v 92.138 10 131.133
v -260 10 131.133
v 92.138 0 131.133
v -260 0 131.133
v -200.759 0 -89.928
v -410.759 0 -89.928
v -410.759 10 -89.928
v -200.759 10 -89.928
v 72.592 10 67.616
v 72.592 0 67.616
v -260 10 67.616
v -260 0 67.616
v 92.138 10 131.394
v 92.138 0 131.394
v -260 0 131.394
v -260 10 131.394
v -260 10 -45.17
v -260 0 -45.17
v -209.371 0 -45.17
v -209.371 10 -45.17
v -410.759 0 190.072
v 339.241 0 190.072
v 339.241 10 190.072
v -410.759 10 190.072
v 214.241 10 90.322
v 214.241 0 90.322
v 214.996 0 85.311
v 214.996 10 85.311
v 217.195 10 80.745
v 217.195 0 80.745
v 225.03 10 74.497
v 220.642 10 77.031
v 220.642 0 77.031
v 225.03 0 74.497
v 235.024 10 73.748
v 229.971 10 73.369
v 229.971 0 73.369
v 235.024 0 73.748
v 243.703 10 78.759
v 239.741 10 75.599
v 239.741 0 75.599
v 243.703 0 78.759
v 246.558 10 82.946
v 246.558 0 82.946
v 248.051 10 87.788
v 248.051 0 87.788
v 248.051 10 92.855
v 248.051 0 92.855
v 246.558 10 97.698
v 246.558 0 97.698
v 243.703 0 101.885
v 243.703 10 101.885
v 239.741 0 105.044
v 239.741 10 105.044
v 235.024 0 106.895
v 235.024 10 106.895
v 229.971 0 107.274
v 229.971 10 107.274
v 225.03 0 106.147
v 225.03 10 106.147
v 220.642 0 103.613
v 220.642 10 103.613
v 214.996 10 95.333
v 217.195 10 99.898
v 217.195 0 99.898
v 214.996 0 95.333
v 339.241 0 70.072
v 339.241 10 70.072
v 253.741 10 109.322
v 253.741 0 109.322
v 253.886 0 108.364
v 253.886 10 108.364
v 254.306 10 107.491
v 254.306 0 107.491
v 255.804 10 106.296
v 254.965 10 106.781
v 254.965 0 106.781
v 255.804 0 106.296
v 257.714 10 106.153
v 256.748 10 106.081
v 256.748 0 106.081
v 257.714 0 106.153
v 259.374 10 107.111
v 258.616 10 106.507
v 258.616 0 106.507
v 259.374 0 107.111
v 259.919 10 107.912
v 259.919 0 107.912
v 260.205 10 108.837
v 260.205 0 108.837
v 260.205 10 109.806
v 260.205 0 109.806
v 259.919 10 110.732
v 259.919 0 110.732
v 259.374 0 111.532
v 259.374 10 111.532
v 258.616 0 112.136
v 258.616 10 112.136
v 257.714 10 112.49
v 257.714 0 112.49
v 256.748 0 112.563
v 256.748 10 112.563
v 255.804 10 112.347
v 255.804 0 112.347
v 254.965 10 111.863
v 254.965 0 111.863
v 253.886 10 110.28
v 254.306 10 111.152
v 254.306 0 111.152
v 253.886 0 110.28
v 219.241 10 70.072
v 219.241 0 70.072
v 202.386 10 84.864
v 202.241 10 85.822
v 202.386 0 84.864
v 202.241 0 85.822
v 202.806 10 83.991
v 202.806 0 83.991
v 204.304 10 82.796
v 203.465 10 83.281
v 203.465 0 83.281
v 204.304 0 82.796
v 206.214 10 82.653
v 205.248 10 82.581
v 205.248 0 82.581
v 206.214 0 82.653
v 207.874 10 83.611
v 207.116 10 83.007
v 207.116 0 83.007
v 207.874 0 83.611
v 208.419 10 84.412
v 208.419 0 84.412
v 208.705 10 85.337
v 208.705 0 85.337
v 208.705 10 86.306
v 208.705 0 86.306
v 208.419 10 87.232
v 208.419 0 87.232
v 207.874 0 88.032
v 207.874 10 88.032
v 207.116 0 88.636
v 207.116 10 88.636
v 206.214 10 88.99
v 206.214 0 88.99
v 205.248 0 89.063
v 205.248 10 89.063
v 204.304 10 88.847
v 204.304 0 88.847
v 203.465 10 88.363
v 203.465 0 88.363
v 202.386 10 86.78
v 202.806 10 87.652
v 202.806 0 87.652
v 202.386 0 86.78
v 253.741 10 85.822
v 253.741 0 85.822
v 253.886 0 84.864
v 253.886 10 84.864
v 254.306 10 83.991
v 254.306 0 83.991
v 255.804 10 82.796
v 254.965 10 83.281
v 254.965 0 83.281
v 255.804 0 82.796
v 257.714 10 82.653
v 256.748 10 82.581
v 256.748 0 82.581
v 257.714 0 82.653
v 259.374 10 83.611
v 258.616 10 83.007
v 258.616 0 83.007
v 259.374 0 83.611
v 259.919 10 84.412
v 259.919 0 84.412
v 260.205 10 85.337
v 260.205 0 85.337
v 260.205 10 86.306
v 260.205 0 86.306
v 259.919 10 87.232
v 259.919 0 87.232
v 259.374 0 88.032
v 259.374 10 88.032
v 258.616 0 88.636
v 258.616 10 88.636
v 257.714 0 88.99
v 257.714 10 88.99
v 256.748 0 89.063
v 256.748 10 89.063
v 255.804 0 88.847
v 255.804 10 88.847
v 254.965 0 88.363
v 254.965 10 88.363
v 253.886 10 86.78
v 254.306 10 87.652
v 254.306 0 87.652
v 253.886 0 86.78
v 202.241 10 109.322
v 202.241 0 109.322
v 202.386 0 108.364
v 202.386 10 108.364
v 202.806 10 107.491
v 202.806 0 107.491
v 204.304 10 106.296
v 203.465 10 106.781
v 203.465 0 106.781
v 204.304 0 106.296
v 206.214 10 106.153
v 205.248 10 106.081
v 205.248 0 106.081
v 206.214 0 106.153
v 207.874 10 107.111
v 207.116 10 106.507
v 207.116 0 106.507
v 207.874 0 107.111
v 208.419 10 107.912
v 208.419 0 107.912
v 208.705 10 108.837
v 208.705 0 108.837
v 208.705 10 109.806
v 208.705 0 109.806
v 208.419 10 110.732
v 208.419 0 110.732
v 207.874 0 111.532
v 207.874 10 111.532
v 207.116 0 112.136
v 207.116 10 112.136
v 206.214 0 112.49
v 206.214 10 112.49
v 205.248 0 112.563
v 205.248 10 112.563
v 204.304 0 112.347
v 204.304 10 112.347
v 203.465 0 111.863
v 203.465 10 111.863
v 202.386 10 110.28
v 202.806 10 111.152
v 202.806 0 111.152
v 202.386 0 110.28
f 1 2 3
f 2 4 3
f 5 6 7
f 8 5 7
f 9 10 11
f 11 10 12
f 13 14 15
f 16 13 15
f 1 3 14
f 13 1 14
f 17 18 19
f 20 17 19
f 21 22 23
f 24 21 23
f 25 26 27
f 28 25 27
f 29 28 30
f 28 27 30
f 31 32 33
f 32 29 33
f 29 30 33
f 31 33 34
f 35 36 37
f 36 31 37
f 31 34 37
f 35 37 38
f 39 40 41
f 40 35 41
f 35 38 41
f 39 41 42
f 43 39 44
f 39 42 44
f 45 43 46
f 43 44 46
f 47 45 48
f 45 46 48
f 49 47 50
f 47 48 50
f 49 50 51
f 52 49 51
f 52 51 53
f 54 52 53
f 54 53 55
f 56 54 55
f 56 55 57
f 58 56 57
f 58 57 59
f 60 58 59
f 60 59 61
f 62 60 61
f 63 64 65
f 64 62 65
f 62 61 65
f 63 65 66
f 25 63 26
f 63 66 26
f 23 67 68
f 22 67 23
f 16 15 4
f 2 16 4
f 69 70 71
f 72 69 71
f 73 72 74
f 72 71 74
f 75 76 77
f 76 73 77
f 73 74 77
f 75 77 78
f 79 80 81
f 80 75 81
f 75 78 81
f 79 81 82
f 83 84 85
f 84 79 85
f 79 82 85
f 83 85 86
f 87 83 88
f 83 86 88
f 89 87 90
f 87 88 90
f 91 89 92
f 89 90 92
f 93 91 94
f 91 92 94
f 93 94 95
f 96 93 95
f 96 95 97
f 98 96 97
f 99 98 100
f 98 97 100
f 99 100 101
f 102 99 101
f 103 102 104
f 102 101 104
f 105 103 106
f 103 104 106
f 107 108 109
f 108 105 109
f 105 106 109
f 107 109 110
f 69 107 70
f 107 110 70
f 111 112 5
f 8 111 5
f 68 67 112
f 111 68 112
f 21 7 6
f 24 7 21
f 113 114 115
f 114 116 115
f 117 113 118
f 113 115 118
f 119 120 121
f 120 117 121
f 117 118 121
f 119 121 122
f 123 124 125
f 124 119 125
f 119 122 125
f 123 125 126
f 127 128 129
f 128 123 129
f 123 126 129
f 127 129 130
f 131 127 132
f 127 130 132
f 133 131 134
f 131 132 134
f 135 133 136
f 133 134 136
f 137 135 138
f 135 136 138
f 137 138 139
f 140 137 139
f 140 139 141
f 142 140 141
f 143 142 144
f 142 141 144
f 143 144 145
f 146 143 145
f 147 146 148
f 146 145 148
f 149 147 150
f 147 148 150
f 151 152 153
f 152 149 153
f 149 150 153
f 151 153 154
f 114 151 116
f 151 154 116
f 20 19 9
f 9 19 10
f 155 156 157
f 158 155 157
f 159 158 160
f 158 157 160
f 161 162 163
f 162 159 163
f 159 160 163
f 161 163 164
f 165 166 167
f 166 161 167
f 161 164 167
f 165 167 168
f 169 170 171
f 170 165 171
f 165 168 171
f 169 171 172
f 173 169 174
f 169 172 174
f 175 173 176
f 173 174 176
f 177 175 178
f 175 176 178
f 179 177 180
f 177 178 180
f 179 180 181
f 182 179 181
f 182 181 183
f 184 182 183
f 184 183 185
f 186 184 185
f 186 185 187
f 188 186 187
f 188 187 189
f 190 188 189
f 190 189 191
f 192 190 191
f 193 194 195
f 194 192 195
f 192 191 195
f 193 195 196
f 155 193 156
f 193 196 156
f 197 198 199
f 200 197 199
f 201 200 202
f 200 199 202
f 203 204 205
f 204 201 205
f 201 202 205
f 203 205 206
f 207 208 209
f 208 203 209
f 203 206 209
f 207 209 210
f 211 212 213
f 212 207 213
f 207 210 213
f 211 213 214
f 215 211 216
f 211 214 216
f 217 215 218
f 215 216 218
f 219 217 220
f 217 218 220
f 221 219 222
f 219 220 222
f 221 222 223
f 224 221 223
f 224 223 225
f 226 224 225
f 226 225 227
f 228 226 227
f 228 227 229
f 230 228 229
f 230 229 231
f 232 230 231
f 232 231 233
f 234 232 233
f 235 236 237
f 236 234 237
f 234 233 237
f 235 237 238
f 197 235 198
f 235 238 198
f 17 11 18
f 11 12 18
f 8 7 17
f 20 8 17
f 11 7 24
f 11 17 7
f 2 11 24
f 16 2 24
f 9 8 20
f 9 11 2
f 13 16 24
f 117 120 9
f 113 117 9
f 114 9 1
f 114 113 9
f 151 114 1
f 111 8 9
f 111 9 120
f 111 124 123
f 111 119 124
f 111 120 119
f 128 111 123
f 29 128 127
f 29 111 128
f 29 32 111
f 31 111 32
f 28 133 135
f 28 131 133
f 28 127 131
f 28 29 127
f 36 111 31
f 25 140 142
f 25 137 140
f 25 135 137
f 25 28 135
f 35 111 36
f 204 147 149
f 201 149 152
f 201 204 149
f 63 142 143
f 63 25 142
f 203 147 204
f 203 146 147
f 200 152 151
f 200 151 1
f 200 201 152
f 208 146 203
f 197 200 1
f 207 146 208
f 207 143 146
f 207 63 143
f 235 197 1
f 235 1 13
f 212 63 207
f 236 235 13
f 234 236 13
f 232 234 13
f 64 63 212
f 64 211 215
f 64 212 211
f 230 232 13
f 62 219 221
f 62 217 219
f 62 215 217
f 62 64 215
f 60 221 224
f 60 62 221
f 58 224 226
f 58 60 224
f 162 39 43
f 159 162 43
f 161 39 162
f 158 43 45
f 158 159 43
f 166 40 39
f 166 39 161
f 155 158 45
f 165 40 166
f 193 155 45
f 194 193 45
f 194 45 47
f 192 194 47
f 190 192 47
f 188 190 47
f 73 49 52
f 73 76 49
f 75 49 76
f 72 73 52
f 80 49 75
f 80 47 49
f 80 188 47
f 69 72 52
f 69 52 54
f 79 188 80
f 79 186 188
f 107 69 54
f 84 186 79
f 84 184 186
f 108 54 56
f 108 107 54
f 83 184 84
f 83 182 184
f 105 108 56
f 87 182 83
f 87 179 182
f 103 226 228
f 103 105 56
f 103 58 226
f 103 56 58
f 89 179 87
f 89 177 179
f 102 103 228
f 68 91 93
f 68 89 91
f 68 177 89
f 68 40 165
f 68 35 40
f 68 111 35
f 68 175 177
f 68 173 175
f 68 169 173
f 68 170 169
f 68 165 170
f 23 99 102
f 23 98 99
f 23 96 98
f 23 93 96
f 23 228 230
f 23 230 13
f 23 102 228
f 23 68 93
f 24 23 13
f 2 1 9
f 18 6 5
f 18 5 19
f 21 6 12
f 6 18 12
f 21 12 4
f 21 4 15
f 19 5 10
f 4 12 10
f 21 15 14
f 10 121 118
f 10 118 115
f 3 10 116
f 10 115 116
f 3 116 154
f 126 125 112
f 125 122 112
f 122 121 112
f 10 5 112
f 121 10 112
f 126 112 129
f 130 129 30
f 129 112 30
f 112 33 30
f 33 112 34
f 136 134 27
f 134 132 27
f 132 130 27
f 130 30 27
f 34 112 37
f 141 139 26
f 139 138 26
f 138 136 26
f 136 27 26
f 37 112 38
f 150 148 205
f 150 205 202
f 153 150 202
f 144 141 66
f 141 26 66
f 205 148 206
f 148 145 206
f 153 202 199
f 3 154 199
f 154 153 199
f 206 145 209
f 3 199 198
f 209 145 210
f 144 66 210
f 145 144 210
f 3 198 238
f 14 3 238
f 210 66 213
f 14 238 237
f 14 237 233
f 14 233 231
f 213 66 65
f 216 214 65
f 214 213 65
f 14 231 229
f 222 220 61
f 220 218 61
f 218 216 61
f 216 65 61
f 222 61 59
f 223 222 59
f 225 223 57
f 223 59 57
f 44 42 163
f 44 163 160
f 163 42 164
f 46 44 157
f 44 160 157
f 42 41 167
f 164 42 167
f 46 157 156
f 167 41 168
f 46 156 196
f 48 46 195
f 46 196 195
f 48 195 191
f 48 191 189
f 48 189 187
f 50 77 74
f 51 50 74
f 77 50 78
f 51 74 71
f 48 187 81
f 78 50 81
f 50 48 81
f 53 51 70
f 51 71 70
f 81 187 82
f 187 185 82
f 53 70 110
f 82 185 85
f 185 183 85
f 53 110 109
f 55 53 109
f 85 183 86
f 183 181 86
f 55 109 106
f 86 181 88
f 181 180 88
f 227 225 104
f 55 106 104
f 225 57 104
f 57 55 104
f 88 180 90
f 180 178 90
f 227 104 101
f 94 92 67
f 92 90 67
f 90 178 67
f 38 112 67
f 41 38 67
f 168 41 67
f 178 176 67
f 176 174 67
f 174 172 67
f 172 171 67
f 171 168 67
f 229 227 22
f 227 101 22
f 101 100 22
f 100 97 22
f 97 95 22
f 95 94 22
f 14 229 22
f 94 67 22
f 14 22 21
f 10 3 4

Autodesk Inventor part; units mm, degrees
ref_plane "YZ Plane" through (0, 0, 0) normal (1, 0, 0) x (0, 1, 0)
ref_plane "XZ Plane" through (0, 0, 0) normal (0, 1, 0) x (-1, 0, 0)
ref_plane "XY Plane" through (0, 0, 0) normal (0, 0, 1) x (1, 0, 0)
sketch "Sketch3" plane through (0, 0, 0) normal (0, 1, 0) x (-1, 0, 0)
  line L0 (-219.2412, 70.0717) -> (200.7588, -89.9283)
  line L1 (205.7588, -63.9283) -> (-110.8967, 62.7339)
  line L2 (200.7588, -89.9283) -> (310.7588, -89.9283)
  line L3 (278.7588, -63.9283) -> (205.7588, -63.9283)
  line L4 (278.7588, 86.3746) -> (278.7588, -63.9283)
  line L5 (310.7588, -89.9283) -> (310.7588, 190.0717)
  line L6 (-110.8967, 86.3746) -> (278.7588, 86.3746)
  line L7 (278.7588, 112.3746) -> (-110.8967, 112.3746)
  line L8 (-110.8967, 150.1531) -> (278.7588, 150.1531)
  line L9 (278.7588, 150.1531) -> (278.7588, 112.3746)
  line L10 (-339.2412, 190.0717) -> (310.7588, 190.0717)
  line L11 (-110.8967, 112.3746) -> (-110.8967, 150.1531)
  line L12 (-339.2412, 70.0717) -> (-219.2412, 70.0717)
  line L13 (-339.2412, 70.0717) -> (-339.2412, 190.0717)
  circle A0 centre (-256.9912, 109.3217) radius 3.25
  circle A1 centre (-256.9912, 85.8217) radius 3.25
  circle A2 centre (-231.2412, 90.3217) radius 17
  circle A3 centre (-205.4912, 85.8217) radius 3.25
  circle A4 centre (-205.4912, 109.3217) radius 3.25
  line L14 (-110.8967, 86.3746) -> (-110.8967, 62.7339)
  line L15 (260, -45.1696) -> (209.3714, -45.1696)
  line L16 (209.3714, -45.1696) -> (-72.5921, 67.6158)
  line L17 (-72.5921, 67.6158) -> (260, 67.6158)
  line L18 (260, 67.6158) -> (260, -45.1696)
  line L19 (260, 131.1334) -> (-92.1379, 131.1334)
  line L20 (-92.1379, 131.1334) -> (-92.1379, 131.3943)
  line L21 (-92.1379, 131.3943) -> (260, 131.3943)
  line L22 (260, 131.3943) -> (260, 131.1334)
  point P0 (0, 0)
extrude "Extrusion2" add sketch "Sketch3" along normal blind 10 contours L12 L13 L10 L5 L2 L0 | L1 L14 L6 L4 L3 | L7 L11 L8 L9
sketch "Sketch4" plane through (-310.7588, 0, -89.9283) normal (-1, 0, 0) x (0, 0, 1)
  line L0 (0, 0) -> (280, 0) projected
  line L1 (280, 0) -> (280, 10) projected
  line L2 (0, 10) -> (280, 10) projected
  line L3 (0, 0) -> (0, 10) projected
  point P0 (89.9283, 0)
extrude "Extrusion3" add sketch "Sketch4" along normal blind 100
properties part number "YFlanPlate" material "Aluminum 6061"
